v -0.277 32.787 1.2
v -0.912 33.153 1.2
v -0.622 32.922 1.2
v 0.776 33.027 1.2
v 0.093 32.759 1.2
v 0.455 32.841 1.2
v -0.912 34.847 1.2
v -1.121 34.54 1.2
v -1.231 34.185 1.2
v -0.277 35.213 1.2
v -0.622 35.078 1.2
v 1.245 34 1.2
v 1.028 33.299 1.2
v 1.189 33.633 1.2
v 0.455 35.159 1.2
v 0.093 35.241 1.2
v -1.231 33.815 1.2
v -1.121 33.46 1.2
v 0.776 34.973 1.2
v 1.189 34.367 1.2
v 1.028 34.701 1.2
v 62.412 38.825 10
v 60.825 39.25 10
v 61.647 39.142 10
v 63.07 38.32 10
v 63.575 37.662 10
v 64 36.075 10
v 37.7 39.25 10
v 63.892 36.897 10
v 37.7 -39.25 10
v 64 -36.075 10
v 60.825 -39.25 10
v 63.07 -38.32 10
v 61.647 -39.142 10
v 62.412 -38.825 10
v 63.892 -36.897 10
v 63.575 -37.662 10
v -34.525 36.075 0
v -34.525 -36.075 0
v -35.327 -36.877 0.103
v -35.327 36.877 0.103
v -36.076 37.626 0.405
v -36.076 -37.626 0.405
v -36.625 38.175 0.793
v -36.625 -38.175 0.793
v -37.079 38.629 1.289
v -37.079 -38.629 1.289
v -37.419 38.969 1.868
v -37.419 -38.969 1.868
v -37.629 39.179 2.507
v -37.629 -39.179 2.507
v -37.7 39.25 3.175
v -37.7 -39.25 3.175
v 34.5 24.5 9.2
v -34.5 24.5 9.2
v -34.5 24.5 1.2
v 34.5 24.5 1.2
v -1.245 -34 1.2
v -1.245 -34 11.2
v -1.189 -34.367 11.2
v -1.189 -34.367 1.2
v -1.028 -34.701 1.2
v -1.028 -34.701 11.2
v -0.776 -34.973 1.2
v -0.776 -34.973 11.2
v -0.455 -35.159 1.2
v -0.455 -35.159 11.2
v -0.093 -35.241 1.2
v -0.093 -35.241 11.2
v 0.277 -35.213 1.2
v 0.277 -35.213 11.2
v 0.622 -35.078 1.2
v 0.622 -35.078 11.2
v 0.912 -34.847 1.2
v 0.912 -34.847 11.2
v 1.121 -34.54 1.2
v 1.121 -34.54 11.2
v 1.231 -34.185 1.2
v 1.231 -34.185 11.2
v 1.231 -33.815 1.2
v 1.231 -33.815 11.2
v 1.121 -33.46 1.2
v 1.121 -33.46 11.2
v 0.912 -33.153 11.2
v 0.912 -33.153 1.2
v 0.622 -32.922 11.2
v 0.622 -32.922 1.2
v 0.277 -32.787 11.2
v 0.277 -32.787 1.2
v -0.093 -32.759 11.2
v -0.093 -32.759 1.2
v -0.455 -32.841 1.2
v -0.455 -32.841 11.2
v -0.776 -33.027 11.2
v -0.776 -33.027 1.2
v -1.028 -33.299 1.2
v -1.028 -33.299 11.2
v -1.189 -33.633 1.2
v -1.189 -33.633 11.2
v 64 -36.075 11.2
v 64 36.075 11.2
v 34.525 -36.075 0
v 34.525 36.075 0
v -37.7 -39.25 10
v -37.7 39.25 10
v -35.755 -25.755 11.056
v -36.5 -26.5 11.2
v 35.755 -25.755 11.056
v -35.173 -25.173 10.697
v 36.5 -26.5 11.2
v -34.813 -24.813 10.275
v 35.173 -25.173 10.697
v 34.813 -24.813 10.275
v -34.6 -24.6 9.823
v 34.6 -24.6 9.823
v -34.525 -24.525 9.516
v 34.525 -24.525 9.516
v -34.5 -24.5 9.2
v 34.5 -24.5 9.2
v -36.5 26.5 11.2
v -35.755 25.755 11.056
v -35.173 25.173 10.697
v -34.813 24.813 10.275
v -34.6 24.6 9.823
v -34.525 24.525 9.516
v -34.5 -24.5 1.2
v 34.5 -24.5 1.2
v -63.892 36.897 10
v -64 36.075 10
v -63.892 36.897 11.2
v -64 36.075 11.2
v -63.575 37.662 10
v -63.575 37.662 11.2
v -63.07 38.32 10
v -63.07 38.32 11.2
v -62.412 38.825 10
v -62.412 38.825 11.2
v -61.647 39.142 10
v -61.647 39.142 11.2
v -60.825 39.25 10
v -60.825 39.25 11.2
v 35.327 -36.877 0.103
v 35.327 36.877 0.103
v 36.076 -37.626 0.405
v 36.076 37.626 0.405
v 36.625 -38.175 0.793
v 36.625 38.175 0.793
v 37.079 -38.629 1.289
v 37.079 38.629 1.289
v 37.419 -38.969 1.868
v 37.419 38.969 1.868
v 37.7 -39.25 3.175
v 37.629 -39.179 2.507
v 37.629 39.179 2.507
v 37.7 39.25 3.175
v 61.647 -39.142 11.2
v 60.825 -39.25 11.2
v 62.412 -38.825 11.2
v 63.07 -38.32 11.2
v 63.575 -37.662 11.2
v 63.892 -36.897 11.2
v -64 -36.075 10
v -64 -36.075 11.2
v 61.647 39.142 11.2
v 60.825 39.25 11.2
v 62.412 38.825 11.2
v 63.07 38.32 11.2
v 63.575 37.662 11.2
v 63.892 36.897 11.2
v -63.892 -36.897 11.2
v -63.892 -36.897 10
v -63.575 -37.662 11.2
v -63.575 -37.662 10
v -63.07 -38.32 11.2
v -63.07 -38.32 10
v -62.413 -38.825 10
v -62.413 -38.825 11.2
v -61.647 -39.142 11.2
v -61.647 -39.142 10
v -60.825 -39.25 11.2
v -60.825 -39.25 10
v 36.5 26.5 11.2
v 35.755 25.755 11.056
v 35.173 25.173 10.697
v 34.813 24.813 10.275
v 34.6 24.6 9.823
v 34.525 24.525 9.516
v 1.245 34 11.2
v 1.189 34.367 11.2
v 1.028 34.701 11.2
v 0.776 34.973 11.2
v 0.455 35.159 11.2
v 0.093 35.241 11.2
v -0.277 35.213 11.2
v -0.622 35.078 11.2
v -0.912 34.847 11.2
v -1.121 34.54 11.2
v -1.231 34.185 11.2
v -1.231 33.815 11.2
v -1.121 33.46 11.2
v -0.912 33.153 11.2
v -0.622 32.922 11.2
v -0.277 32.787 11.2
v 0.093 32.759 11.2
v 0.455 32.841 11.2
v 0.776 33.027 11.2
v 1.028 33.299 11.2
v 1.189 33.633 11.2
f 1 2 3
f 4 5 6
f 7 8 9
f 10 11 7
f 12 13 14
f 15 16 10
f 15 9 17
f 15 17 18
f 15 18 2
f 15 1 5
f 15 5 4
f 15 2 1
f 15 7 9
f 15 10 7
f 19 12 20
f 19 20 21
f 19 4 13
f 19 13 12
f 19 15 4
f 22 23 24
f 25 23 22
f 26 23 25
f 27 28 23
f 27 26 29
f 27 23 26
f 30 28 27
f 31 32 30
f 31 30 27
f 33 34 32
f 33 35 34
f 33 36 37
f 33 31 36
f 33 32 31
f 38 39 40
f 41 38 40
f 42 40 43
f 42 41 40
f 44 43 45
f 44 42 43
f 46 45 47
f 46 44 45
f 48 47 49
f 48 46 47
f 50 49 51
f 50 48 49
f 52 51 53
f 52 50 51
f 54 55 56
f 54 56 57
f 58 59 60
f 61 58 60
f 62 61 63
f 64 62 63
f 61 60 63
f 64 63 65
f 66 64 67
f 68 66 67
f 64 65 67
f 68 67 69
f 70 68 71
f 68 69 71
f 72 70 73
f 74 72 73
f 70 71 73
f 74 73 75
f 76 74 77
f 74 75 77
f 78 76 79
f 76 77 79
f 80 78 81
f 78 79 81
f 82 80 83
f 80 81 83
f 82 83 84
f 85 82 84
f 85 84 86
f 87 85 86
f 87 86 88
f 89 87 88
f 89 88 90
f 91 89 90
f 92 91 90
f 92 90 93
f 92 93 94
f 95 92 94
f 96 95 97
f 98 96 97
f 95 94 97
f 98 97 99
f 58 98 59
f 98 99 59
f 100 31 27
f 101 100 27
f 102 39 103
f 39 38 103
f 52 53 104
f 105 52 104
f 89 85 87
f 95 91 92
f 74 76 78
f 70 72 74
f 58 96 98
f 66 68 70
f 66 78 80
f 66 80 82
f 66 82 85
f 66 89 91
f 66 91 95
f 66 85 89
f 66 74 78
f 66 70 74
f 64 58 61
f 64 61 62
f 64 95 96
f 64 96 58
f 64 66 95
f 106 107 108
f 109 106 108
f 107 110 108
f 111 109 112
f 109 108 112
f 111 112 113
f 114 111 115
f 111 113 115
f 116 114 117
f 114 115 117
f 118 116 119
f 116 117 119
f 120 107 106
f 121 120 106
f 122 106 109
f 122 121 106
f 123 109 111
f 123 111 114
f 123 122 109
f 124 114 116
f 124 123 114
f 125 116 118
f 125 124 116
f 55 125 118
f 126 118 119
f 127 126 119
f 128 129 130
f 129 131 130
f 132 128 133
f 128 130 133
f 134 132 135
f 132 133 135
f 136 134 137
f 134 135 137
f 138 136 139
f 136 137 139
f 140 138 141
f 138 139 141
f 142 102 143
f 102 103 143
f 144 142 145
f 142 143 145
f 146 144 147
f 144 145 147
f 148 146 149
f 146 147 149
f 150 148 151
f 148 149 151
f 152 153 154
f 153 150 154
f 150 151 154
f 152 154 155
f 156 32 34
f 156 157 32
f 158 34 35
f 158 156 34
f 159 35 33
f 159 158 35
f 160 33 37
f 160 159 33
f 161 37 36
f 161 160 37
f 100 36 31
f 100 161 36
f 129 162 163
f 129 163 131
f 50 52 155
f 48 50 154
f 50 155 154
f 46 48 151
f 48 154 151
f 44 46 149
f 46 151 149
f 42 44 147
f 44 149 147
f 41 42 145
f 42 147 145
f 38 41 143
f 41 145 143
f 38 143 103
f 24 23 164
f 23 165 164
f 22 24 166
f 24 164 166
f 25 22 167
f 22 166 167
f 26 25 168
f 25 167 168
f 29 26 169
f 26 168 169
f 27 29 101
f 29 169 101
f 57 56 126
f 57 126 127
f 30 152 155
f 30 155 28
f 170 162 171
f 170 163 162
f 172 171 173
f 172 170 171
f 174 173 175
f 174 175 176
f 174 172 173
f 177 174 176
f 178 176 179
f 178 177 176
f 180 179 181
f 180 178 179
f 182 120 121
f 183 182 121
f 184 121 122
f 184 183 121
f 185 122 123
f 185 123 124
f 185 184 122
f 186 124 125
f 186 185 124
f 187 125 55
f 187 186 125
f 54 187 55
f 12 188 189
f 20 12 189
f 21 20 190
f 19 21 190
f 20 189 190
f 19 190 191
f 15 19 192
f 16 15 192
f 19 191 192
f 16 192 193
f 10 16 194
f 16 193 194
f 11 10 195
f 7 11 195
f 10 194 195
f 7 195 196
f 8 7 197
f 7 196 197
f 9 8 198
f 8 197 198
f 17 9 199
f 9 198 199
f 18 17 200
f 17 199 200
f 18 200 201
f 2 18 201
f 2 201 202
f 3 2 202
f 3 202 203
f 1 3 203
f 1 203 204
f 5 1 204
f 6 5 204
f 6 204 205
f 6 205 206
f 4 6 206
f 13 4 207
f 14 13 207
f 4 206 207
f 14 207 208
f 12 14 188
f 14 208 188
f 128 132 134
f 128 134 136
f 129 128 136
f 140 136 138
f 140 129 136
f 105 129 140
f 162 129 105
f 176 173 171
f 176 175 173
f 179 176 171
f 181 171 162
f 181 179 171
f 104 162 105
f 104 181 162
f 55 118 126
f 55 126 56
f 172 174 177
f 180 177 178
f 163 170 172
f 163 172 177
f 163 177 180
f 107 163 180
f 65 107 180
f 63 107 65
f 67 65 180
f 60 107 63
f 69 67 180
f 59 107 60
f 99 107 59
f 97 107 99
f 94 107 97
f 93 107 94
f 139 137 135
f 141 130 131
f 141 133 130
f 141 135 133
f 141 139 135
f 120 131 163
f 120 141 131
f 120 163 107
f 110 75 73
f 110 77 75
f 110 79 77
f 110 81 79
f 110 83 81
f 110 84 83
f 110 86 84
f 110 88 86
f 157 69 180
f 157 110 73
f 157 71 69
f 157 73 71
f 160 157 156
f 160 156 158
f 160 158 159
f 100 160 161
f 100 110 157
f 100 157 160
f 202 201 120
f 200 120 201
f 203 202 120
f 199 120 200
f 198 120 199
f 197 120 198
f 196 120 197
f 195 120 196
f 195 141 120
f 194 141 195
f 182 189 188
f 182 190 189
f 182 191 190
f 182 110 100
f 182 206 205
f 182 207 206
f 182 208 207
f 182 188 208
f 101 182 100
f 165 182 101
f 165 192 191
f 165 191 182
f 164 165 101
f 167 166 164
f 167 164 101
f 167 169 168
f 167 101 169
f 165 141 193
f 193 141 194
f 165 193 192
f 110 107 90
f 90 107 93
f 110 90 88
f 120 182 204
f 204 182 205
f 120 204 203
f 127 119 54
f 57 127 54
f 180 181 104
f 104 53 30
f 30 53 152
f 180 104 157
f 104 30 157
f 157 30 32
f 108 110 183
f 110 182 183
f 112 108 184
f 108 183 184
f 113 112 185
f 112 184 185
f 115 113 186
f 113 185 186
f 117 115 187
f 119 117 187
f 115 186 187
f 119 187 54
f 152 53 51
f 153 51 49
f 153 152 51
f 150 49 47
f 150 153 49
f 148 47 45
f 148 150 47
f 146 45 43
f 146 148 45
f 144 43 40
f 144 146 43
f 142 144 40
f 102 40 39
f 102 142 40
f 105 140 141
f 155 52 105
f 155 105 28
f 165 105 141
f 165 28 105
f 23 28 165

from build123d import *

# Parameters (mm, degrees)
SKETCH1_W           = 128
SKETCH1_H           = 78.5
BOSS_EXTRUDE1_DEPTH = 11.2
SKETCH2_W           = 69
SKETCH2_H           = 49
CUT_EXTRUDE1_DEPTH  = 10
FILLET2_R           = 2
SKETCH3_R           = 1.2446
CUT_EXTRUDE2_DEPTH  = 10
CUT_EXTRUDE3_REACH  = 103.9
SKETCH5_W           = 26.3
SKETCH5_H           = 10
FILLET3_R           = 3.175


with BuildPart() as part:
    # Sketch1 → Boss-Extrude1 (new body)
    with BuildSketch(Plane.XY):
        Rectangle(SKETCH1_W, SKETCH1_H)
    extrude(amount=BOSS_EXTRUDE1_DEPTH)

    # Sketch2 → Cut-Extrude1 (cut)
    with BuildSketch(Plane.XY.offset(11.2)):
        Rectangle(SKETCH2_W, SKETCH2_H)
    extrude(amount=-CUT_EXTRUDE1_DEPTH, mode=Mode.SUBTRACT)

    # Fillet2
    fillet2_edges = [part.edges().sort_by_distance(p)[0] for p in [
        (34.5, 0, 11.2),
        (0, 24.5, 11.2),
        (-34.5, 0, 11.2),
        (0, -24.5, 11.2),
    ]]
    fillet(fillet2_edges, radius=FILLET2_R)

    # Sketch3 → Cut-Extrude2 (cut)
    with BuildSketch(Plane.XY.offset(11.2)):
        with Locations((0, 34)):
            Circle(SKETCH3_R)
        with Locations(Location((0, -34, 0), (0, 0, 180))):
            Circle(SKETCH3_R)
    extrude(amount=-CUT_EXTRUDE2_DEPTH, mode=Mode.SUBTRACT)

    # Sketch5 → Cut-Extrude3 (cut, up to next)
    with BuildSketch(Plane.XZ.offset(39.25), mode=Mode.PRIVATE) as cut_extrude3_sk1:
        with Locations((50.85, 5)):
            Rectangle(SKETCH5_W, SKETCH5_H)
    cut_extrude3_tool1 = extrude(cut_extrude3_sk1.sketch, amount=-CUT_EXTRUDE3_REACH, mode=Mode.PRIVATE) & part.part
    # Sketch5 → Cut-Extrude3 (cut, up to next)
    with BuildSketch(Plane.XZ.offset(39.25), mode=Mode.PRIVATE) as cut_extrude3_sk2:
        with Locations((-50.85, 5)):
            Rectangle(SKETCH5_W, SKETCH5_H)
    cut_extrude3_tool2 = extrude(cut_extrude3_sk2.sketch, amount=-CUT_EXTRUDE3_REACH, mode=Mode.PRIVATE) & part.part
    add(cut_extrude3_tool1.solids().sort_by_distance((50.85, -39.25, 5))[0], mode=Mode.SUBTRACT)
    add(cut_extrude3_tool2.solids().sort_by_distance((-50.85, -39.25, 5))[0], mode=Mode.SUBTRACT)

    # Fillet3
    fillet3_edges = [part.edges().sort_by_distance(p)[0] for p in [
        (0, -39.25, 0),
        (0, 39.25, 0),
        (37.7, 0, 0),
        (-37.7, 0, 0),
        (64, -39.25, 10.6),
        (-64, -39.25, 10.6),
        (-64, 39.25, 10.6),
        (64, 39.25, 10.6),
    ]]
    fillet(fillet3_edges, radius=FILLET3_R)


solid = part.part
